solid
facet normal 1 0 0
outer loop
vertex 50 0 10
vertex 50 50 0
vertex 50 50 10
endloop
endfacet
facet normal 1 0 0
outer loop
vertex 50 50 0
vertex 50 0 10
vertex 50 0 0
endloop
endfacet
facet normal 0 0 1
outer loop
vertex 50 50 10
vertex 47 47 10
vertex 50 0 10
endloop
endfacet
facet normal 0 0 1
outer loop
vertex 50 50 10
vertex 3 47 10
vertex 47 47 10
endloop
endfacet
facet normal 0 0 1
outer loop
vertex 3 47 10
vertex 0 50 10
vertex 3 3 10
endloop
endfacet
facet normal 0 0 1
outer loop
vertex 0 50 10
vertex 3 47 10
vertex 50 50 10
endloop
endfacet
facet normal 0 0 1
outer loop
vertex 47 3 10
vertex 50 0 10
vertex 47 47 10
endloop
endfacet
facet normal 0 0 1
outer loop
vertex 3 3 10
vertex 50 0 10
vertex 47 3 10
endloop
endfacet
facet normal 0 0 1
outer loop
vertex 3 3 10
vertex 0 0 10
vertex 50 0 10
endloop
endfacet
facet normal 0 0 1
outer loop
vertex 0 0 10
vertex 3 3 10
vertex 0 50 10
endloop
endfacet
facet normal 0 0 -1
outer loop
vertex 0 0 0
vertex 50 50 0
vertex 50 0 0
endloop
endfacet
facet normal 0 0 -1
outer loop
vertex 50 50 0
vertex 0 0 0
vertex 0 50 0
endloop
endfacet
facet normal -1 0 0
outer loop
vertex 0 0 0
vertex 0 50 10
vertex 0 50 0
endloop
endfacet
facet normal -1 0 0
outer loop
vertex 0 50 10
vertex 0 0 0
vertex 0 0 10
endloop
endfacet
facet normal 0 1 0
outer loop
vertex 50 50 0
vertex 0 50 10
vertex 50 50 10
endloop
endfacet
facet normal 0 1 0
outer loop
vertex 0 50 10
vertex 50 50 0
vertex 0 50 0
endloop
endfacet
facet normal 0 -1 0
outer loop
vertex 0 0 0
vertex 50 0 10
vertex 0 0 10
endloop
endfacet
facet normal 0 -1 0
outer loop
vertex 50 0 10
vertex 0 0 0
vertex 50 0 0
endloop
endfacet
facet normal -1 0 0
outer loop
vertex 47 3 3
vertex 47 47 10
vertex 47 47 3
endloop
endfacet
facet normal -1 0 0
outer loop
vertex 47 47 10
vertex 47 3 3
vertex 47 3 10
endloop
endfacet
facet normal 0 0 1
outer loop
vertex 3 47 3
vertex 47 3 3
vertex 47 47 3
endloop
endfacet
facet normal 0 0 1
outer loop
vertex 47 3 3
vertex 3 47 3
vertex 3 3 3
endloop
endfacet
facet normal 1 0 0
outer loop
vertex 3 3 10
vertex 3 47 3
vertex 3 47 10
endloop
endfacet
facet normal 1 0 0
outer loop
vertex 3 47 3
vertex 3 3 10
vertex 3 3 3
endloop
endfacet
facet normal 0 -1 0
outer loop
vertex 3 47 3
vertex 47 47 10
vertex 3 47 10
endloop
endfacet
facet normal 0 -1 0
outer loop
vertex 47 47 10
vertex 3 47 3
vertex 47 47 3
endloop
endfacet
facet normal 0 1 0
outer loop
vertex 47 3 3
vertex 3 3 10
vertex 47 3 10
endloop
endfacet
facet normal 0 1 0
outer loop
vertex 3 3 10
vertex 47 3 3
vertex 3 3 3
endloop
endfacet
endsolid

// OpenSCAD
// Generated by HEIDI for job job_1787781903727_64d25c66
// Product: 3D-Printable Model Preparation Package
// Request: Failure injection test
// Model type: box
// Generated: 2026-09-07T04:35:15.641Z
//
// This is a parameterized OpenSCAD model. You can adjust the
// parameters below to customize the dimensions before rendering.

// ─── Parameters ───
width = 50;       // X dimension in mm
height = 50;     // Y dimension in mm
depth = 10;       // Z dimension in mm
wall = 3;    // wall thickness in mm
$fn = 60;               // facet resolution

// Parametric hollow box
module parametric_box() {
    difference() {
        // Outer shell
        cube([width, height, depth]);
        // Inner cavity
        translate([wall, wall, wall])
            cube([width - wall * 2, height - wall * 2, depth - wall + 1]);
    }
}
parametric_box();
